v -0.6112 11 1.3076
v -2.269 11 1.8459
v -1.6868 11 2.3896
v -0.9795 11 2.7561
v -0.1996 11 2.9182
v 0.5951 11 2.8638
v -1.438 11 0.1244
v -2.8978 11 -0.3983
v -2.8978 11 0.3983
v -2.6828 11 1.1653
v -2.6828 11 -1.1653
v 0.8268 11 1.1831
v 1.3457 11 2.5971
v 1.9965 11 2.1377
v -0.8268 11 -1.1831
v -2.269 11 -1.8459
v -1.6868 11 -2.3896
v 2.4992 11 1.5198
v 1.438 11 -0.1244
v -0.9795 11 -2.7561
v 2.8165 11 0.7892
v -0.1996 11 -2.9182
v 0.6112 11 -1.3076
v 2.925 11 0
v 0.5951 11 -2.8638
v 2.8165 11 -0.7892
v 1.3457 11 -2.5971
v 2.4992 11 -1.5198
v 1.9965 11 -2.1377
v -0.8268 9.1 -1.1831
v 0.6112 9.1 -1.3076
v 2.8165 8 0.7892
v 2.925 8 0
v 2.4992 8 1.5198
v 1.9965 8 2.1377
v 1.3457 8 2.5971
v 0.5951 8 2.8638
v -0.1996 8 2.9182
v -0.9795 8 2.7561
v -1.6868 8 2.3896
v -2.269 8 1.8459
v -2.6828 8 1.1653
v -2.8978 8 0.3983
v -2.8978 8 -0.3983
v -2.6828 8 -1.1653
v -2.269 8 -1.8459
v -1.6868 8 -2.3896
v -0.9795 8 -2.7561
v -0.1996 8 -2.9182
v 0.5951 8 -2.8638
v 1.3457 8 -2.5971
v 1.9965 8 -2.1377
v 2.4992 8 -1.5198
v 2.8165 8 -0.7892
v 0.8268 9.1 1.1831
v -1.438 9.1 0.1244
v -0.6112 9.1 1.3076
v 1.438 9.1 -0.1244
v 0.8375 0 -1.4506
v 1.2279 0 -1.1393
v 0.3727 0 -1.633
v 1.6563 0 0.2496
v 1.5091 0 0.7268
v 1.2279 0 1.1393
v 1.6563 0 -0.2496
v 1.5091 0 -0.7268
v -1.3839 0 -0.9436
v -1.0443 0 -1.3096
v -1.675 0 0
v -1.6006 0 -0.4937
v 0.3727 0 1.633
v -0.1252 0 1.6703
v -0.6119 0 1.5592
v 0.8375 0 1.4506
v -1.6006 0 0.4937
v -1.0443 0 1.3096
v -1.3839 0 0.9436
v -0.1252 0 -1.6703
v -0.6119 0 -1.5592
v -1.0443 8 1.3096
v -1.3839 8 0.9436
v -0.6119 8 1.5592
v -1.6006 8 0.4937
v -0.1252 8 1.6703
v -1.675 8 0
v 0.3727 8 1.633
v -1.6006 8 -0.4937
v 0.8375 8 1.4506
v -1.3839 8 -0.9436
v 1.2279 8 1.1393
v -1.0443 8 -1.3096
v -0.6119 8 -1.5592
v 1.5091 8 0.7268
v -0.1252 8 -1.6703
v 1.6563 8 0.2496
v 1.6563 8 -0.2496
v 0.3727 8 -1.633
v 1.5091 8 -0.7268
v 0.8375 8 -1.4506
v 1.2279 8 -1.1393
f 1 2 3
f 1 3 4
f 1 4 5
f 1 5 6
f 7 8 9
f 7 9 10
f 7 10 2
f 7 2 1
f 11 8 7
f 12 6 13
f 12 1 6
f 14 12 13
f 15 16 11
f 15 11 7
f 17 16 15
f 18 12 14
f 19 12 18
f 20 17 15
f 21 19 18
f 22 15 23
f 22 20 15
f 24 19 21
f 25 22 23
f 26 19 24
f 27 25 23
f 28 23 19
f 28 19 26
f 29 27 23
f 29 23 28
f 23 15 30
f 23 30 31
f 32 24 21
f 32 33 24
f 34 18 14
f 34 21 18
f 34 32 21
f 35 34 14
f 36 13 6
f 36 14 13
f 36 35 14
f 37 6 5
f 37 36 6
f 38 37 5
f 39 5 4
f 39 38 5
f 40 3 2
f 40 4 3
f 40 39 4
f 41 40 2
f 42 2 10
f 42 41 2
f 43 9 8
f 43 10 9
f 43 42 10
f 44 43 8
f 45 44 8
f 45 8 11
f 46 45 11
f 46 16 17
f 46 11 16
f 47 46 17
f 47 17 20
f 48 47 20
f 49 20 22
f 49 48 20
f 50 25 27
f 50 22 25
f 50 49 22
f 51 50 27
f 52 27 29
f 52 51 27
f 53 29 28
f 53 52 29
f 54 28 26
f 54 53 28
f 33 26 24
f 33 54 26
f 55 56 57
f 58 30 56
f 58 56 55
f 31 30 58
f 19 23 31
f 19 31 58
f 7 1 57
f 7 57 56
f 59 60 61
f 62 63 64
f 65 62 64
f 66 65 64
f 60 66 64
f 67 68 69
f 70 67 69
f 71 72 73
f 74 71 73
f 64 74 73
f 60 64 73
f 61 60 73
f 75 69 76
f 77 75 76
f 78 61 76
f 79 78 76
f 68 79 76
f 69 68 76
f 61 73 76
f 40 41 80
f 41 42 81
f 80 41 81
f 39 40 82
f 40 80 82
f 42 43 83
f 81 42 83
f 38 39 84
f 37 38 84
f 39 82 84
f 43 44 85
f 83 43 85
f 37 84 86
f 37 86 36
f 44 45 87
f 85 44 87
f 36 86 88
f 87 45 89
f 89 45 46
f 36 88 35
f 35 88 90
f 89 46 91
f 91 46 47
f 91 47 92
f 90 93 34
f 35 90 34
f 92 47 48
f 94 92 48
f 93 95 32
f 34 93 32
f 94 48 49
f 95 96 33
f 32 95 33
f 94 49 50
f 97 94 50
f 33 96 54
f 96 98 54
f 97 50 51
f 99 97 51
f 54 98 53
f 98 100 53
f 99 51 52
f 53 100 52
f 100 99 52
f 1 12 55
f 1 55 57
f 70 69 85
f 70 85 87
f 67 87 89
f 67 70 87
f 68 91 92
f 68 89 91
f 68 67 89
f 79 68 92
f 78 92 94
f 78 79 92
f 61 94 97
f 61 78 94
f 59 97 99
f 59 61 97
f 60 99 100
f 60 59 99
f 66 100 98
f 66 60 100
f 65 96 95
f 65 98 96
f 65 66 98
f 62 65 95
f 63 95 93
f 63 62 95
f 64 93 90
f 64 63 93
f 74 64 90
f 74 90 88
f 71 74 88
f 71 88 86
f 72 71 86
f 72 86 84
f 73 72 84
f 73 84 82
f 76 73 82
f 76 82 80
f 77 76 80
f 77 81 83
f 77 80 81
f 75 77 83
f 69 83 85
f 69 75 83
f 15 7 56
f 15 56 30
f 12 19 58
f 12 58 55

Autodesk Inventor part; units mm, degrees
ref_plane "YZ Plane" through (0, 0, 0) normal (1, 0, 0) x (0, 1, 0)
ref_plane "XZ Plane" through (0, 0, 0) normal (0, 1, 0) x (-1, 0, 0)
ref_plane "XY Plane" through (0, 0, 0) normal (0, 0, 1) x (1, 0, 0)
sketch "Sketch1" plane through (0, 0, 0) normal (0, 1, 0) x (-1, 0, 0)
  circle A0 centre (0, 0) radius 1.675
  dimension "d0" = 3.35
extrude "Extrusion1" add sketch "Sketch1" along normal blind 8
sketch "Sketch2" plane through (0, 8, 0) normal (0, 1, 0) x (1, 0, 0)
  circle A0 centre (0, 0) radius 1.675 projected
  circle A1 centre (0, 0) radius 2.925
  dimension "d3" = 5.85
extrude "Extrusion2" add sketch "Sketch2" along normal blind 3 contours A0 | A1
sketch "Sketch3" plane through (0, 11, 0) normal (0, 1, 0) x (1, 0, 0)
  line L0 (-0.8268, 1.1831) -> (0.6112, 1.3076)
  line L1 (0.6112, 1.3076) -> (1.438, 0.1244)
  line L2 (1.438, 0.1244) -> (0.8268, -1.1831)
  line L3 (0.8268, -1.1831) -> (-0.6112, -1.3076)
  line L4 (-0.6112, -1.3076) -> (-1.438, -0.1244)
  line L5 (-1.438, -0.1244) -> (-0.8268, 1.1831)
  point P0 (0, 0)
  point P1 (0, 0)
  dimension "d6" = 2.5
extrude "Extrusion3" cut sketch "Sketch3" against normal blind 1.9
equation "\"d0\" = screw_m3_A"
equation "\"d1\" = screw_m3_B"
equation "\"d3\" = screw_m3_C"
equation "\"d4\" = screw_m3_D"
equation "\"screw_m3_B\" = 8"
equation "\"screw_m3_D\" = 3"
equation "\"screw_m3_A\" = 3.35"
equation "\"screw_m3_C\" = 5.85"
properties part number "M3_SCREW_8MM"
